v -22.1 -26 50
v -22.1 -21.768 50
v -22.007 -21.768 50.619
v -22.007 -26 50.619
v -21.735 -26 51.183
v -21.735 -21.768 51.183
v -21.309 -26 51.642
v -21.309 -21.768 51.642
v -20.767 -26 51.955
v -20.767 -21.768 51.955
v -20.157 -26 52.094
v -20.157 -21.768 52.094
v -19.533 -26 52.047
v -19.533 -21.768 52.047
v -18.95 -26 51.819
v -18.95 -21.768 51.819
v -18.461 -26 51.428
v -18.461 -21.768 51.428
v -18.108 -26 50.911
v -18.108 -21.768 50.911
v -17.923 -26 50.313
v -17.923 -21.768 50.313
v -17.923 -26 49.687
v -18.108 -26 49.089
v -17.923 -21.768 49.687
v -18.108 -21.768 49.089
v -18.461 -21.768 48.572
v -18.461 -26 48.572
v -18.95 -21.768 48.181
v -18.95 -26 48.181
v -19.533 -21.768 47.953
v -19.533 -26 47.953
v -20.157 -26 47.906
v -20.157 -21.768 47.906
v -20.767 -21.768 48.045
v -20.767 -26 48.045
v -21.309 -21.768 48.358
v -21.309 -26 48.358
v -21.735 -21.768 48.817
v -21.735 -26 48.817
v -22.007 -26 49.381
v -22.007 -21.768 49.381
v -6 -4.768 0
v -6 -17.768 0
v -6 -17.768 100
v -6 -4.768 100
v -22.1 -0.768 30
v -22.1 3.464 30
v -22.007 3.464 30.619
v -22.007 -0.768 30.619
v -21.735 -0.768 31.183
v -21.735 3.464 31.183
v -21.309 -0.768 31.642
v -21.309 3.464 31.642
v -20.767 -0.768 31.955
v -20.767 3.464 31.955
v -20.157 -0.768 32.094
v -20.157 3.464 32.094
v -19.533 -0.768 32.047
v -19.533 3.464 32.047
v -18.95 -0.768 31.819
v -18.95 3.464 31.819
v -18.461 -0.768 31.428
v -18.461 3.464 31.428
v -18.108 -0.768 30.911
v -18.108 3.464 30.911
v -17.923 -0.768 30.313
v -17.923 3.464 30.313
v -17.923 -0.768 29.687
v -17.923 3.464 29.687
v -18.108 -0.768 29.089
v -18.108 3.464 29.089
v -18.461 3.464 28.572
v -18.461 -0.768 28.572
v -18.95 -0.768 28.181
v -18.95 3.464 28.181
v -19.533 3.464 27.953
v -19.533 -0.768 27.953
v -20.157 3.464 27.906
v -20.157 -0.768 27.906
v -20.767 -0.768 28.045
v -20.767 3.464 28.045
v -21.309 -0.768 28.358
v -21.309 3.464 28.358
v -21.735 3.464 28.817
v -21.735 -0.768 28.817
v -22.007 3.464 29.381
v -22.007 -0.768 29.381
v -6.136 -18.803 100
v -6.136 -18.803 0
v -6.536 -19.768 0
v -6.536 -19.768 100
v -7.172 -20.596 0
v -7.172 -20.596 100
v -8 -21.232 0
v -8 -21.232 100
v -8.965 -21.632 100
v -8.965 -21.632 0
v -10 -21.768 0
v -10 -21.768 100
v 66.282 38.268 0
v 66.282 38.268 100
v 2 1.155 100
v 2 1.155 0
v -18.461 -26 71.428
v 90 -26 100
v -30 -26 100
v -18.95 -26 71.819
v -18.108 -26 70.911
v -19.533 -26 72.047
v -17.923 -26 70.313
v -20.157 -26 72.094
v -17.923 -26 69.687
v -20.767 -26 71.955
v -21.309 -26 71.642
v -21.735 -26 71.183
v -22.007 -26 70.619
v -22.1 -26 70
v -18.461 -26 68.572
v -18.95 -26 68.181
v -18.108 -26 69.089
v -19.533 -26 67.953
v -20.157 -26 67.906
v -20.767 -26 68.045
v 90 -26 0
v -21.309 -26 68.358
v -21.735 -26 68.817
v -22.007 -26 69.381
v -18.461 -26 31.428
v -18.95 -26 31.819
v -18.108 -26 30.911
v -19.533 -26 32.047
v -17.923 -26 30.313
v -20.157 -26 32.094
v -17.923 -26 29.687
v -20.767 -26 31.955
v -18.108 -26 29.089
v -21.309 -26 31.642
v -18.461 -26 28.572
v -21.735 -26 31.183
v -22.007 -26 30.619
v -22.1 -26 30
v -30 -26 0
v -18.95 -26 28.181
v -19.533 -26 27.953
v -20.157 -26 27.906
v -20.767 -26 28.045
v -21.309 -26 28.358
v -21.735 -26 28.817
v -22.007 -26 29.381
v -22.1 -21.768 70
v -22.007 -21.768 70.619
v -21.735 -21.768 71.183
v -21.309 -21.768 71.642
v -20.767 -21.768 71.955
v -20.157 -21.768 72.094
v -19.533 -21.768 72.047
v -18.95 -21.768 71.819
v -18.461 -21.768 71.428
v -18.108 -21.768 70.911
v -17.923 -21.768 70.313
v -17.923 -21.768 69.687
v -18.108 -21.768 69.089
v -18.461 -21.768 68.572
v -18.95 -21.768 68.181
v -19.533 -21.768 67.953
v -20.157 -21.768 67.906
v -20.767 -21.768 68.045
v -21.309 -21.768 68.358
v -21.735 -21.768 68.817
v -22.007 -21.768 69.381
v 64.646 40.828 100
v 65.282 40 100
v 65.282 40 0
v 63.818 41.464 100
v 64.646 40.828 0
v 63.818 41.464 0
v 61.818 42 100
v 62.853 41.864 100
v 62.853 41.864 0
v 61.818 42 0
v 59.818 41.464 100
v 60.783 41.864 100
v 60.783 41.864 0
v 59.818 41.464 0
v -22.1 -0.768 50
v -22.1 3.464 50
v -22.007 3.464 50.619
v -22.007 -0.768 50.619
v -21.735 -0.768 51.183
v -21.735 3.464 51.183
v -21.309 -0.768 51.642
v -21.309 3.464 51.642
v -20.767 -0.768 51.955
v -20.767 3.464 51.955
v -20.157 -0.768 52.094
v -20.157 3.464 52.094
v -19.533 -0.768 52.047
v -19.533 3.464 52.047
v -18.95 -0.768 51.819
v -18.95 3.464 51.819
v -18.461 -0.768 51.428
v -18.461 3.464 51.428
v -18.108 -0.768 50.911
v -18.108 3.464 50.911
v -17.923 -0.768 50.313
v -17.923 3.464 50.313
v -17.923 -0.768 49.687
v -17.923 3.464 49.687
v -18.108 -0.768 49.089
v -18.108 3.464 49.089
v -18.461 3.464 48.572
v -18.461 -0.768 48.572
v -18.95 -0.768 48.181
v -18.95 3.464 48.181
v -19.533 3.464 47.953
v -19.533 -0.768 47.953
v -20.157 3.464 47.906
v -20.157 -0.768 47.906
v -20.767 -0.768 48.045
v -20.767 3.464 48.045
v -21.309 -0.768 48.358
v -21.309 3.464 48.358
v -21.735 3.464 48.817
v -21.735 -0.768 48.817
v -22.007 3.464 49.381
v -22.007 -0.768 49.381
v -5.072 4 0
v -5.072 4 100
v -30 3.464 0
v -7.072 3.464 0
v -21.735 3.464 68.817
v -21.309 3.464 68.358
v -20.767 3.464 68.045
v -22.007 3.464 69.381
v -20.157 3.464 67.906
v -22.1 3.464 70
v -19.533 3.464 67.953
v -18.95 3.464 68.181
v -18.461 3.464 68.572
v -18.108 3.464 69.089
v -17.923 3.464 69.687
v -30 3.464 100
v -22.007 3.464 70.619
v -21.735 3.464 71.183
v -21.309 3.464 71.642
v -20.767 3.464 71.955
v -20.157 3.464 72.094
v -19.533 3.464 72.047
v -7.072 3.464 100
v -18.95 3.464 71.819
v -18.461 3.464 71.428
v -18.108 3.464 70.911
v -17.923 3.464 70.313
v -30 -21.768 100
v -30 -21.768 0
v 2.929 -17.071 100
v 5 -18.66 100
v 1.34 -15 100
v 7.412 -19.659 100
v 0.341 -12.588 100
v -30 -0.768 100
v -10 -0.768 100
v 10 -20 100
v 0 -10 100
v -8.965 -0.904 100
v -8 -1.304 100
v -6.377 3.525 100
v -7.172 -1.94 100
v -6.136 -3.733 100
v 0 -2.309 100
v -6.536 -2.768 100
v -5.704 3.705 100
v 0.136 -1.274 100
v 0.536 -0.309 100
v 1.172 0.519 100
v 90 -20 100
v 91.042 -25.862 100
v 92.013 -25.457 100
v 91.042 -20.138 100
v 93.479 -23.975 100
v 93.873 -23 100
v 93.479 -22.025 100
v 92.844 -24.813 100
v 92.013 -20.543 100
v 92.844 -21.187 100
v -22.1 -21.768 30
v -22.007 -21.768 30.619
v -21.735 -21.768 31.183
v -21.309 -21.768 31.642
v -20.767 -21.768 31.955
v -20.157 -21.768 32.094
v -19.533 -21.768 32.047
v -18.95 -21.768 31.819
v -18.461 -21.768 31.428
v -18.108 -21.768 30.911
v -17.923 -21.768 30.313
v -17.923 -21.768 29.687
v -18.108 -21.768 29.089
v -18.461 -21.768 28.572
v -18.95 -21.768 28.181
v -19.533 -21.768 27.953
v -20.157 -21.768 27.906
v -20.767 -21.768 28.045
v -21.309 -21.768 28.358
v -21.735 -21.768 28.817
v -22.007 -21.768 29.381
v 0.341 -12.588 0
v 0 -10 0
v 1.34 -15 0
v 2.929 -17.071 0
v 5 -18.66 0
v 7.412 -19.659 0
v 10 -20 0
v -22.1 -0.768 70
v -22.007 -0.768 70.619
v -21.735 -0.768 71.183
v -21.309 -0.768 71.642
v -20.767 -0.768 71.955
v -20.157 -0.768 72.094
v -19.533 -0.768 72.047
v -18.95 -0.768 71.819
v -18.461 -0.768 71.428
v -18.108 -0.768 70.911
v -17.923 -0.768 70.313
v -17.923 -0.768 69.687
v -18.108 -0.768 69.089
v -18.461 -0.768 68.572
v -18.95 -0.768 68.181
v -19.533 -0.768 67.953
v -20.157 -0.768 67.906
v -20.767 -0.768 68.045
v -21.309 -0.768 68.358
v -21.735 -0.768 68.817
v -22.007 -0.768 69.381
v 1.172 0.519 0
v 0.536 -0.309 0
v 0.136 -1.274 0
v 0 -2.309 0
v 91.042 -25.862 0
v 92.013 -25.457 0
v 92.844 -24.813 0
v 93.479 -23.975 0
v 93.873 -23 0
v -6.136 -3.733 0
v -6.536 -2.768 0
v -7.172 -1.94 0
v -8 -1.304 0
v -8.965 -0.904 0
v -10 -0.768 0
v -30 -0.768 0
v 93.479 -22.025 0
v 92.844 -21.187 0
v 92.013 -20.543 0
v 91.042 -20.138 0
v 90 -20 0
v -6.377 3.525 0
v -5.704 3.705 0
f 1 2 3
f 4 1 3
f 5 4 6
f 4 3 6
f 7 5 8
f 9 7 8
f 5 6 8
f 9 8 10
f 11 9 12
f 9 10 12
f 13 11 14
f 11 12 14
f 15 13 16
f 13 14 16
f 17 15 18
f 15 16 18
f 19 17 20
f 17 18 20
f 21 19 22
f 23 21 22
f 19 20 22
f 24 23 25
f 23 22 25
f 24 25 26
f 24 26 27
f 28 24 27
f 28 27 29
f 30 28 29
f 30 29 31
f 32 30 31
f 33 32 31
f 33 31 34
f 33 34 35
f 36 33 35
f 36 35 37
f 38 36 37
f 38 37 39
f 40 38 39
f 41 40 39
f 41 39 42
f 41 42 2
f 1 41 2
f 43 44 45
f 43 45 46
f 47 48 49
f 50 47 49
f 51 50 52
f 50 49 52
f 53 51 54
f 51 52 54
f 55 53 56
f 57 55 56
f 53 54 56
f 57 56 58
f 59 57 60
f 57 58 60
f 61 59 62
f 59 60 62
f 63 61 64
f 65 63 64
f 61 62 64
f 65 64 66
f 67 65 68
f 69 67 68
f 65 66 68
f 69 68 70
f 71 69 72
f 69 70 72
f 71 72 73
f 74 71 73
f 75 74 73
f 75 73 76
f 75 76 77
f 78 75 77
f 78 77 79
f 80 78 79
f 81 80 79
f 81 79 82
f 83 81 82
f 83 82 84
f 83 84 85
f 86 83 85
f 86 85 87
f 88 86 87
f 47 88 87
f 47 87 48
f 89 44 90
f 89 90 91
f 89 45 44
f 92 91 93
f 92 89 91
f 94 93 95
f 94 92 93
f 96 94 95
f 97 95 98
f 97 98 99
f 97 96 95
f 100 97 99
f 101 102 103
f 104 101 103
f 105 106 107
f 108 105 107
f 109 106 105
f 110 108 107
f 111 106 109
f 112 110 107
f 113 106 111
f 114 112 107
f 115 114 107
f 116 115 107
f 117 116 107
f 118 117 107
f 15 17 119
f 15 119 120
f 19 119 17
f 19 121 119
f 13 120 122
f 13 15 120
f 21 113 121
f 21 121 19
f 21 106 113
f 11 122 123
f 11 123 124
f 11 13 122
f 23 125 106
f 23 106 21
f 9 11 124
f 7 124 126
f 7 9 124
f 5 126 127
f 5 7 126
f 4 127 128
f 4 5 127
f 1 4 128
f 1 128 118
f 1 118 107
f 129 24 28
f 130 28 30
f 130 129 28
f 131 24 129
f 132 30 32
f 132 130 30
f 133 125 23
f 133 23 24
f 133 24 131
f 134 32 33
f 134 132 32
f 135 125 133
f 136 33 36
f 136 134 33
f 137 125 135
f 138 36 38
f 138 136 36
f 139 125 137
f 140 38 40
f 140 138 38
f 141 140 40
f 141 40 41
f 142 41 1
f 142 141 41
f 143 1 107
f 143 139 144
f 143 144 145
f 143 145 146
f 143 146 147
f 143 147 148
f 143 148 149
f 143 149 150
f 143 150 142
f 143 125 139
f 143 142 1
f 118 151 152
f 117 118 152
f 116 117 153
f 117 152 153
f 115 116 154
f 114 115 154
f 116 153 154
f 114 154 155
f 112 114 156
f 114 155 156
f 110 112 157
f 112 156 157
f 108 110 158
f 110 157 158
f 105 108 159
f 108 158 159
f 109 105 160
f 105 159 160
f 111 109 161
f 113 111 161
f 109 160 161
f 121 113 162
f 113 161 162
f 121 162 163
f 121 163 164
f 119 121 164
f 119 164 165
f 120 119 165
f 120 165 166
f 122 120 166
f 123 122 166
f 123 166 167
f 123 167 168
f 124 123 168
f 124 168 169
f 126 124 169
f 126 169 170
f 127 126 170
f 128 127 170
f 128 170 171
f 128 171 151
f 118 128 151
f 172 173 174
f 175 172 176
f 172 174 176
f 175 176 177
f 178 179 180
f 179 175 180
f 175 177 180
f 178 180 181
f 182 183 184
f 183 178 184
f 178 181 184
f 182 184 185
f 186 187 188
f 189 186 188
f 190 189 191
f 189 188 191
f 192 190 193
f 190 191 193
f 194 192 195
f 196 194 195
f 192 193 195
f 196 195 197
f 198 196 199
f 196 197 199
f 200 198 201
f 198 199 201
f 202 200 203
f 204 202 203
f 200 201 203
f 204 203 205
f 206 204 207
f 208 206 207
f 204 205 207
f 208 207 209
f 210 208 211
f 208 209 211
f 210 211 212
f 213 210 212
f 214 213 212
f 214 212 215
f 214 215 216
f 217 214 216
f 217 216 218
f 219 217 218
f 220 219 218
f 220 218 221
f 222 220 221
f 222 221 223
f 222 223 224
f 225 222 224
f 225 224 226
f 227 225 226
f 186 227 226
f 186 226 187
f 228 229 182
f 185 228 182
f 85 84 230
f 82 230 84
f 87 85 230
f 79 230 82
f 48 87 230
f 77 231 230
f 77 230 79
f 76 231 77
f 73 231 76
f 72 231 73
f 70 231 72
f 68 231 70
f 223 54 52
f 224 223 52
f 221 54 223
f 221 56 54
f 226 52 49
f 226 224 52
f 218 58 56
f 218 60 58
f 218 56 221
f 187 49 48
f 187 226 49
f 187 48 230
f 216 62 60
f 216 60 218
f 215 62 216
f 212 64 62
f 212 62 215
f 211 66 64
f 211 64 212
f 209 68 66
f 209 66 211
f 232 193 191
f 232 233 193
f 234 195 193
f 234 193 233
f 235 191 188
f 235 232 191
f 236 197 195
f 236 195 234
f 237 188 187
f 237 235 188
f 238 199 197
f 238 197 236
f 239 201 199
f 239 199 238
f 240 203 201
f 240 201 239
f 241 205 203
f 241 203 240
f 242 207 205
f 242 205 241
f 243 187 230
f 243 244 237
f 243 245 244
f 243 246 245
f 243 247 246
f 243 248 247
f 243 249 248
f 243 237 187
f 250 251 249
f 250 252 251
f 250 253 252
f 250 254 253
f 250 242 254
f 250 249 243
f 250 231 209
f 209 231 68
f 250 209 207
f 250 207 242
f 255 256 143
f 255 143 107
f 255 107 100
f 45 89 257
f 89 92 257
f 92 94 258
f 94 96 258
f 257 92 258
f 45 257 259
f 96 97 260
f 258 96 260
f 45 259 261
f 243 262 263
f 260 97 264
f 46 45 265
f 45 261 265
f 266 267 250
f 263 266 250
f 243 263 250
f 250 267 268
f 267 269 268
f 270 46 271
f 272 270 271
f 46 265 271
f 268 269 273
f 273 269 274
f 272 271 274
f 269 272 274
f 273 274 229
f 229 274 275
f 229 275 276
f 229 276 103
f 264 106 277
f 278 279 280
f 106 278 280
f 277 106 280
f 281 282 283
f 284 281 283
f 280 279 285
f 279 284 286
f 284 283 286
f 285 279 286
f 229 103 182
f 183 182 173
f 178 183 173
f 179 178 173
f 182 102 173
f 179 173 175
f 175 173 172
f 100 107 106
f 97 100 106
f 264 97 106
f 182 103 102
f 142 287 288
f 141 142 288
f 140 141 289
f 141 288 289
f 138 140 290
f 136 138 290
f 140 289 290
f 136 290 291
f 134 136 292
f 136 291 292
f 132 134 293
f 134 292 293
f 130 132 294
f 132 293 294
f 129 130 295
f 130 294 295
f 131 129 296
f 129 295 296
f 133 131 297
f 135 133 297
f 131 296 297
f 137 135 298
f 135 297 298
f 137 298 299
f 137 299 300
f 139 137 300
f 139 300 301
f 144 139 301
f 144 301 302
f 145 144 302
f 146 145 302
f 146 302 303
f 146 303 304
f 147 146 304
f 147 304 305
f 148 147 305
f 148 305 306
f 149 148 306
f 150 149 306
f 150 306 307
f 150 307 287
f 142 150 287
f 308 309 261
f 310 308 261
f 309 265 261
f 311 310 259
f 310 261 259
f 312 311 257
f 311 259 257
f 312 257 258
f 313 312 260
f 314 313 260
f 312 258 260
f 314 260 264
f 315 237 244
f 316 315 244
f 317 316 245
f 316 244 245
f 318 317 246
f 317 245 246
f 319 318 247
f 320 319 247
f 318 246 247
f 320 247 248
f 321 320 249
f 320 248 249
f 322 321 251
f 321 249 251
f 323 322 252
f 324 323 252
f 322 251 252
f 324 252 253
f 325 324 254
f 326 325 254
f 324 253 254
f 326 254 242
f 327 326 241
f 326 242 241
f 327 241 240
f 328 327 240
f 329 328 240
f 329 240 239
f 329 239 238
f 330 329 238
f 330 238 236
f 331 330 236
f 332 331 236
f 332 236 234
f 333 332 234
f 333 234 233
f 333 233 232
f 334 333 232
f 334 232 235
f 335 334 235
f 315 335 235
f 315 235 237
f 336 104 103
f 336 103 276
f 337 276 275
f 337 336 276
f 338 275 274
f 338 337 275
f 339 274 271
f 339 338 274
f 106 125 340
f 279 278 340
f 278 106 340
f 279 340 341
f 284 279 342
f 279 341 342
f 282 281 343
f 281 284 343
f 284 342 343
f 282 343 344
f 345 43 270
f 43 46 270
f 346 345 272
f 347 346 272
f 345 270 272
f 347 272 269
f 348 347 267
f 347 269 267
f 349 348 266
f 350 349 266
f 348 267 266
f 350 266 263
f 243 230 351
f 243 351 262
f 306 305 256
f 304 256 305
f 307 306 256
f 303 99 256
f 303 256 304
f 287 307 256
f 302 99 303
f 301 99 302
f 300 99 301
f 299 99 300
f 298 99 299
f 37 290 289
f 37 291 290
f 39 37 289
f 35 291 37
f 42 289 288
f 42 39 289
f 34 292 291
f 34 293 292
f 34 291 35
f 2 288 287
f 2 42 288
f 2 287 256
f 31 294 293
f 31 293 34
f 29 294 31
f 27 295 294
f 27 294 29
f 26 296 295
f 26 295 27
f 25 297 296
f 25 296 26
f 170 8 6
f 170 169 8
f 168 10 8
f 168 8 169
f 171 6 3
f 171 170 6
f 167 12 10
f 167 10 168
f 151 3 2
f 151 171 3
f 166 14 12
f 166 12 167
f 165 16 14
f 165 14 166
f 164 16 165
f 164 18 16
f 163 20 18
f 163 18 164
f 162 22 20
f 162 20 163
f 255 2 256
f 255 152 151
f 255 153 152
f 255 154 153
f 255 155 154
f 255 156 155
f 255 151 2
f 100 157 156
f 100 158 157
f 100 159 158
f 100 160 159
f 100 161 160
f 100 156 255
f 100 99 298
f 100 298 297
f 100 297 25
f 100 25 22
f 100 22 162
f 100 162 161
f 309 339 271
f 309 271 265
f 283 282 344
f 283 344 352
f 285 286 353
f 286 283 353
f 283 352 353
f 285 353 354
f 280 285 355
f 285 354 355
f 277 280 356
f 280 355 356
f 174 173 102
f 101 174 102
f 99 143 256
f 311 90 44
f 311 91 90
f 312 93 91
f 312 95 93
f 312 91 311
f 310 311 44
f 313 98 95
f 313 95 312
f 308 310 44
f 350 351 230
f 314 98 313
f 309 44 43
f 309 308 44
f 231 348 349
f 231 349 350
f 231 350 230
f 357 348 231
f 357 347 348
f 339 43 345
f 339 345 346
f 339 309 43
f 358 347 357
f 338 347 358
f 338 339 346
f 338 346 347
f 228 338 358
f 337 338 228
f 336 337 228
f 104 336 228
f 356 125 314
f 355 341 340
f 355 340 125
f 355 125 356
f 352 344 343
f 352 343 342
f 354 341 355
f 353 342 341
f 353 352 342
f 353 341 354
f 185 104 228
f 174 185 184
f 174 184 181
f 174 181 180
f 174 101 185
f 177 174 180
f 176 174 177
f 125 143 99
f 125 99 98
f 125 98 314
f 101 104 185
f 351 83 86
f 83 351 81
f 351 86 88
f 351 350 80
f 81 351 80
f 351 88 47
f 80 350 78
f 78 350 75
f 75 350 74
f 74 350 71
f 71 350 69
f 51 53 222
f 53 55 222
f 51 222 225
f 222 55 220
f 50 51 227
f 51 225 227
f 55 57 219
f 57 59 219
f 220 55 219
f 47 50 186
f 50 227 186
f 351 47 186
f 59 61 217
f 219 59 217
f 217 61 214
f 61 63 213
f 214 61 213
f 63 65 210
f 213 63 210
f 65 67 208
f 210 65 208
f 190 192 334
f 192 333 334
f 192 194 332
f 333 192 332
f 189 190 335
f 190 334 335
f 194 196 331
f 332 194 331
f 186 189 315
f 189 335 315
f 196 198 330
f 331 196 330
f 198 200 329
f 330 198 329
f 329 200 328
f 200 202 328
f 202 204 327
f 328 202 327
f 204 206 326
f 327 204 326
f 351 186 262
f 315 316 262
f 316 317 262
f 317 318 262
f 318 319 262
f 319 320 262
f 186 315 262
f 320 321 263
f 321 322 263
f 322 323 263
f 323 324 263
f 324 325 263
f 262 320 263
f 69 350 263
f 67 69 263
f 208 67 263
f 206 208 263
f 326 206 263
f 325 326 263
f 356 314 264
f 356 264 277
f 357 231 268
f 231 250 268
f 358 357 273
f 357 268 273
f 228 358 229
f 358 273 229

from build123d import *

# Parameters (mm, degrees)
EXTRUDE_1_DEPTH     = 100
FILLET_1_R          = 4
SKETCH_2_W          = 100
SKETCH_2_H          = 4.232050807
SKETCH_2_H_2        = 4.232050808
EXTRUDE_2_DEPTH     = 24
FILLET_2_R          = 4
FILLET_3_R          = 4
SKETCH_3_R          = 2.1
CUT_EXTRUDE_2_DEPTH = 143.468075254
FILLET_4_R          = 10


with BuildPart() as part:
    # 草图1 → 凸台-拉伸1 (new body)
    with BuildSketch(Plane.XY):
        Polygon((66.282032303, 38.267949192), (0, 0), (0, -20), (94, -20), (94, -26), (-6, -26), (-6, 3.464101615), (63.282032303, 43.464101615), align=None)
    extrude(amount=EXTRUDE_1_DEPTH)

    # 圆角1
    # the kernel refuses this fillet: 4 mm, written as the material it adds along each edge
    with BuildSketch(Plane(origin=(0, 0, 0), x_dir=(0.8660254037844385, 0.5000000000000003, 0), z_dir=(0, 0, 1))) as fillet_1_piece_1:
        with BuildLine():
            CenterArc((FILLET_1_R * 0.57735026919, -FILLET_1_R), FILLET_1_R, 90, 60)
            Line((-FILLET_1_R * 0.288675134595, -FILLET_1_R * 0.5), (0, 0))
            Line((0, 0), (FILLET_1_R * 0.57735026919, 0))
        make_face()
    extrude(amount=100)
    # the kernel refuses this fillet: 4 mm, written as the material it takes off along each edge
    with BuildSketch(Plane(origin=(94, -20, -10), x_dir=(-1, 0, 0), z_dir=(0, 0, 1)), Plane(origin=(94, -26, -10), x_dir=(0, 1, 0), z_dir=(0, 0, 1))) as fillet_1_2_piece_1:
        with BuildLine():
            CenterArc((FILLET_1_R, FILLET_1_R), FILLET_1_R, 180, 90)
            Line((0, FILLET_1_R), (0, 0))
            Line((0, 0), (FILLET_1_R, 0))
        make_face()
    extrude(amount=120, mode=Mode.SUBTRACT)
    with BuildSketch(Plane(origin=(63.282032303, 43.464101615, -10), x_dir=(0.49999999999999706, -0.8660254037844404, 0), z_dir=(0, 0, 1))) as fillet_1_2_piece_2:
        with BuildLine():
            CenterArc((FILLET_1_R, -FILLET_1_R), FILLET_1_R, 90, 90)
            Line((0, -FILLET_1_R), (0, 0))
            Line((0, 0), (FILLET_1_R, 0))
        make_face()
    extrude(amount=120, mode=Mode.SUBTRACT)

    # 草图2 → 凸台-拉伸2 (add)
    with BuildSketch(Plane.ZY.offset(6)):
        with Locations((50, 1.348076212)):
            Rectangle(SKETCH_2_W, SKETCH_2_H)
        with Locations((50, -23.883974596)):
            Rectangle(SKETCH_2_W, SKETCH_2_H_2)
    extrude(amount=EXTRUDE_2_DEPTH)

    # 圆角2
    fillet_2_edges = [part.edges().sort_by_distance(p)[0] for p in [
        (-6, -0.767949192, 50),
        (-6, -21.767949192, 50),
    ]]
    fillet(fillet_2_edges, radius=FILLET_2_R)

    # 圆角3
    fillet_3_edges = [part.edges().sort_by_distance(p)[0] for p in [
        (-6, 3.464101615, 50),
    ]]
    fillet(fillet_3_edges, radius=FILLET_3_R)

    # 草图3 → 切除-拉伸2 (cut, through all)
    with BuildSketch(Plane(origin=(0, 3.464101615, 0), x_dir=(1, 0, 0), z_dir=(0, 1, 0))):
        with Locations(Location((-20, -30, 0), (0, 0, 180))):
            Circle(SKETCH_3_R)
        with Locations(Location((-20, -50, 0), (0, 0, 180))):
            Circle(SKETCH_3_R)
        with Locations(Location((-20, -70, 0), (0, 0, 180))):
            Circle(SKETCH_3_R)
    extrude(amount=-CUT_EXTRUDE_2_DEPTH, mode=Mode.SUBTRACT)

    # 圆角4
    fillet_4_edges = [part.edges().sort_by_distance(p)[0] for p in [
        (0, -20, 50),
    ]]
    fillet(fillet_4_edges, radius=FILLET_4_R)


solid = part.part
